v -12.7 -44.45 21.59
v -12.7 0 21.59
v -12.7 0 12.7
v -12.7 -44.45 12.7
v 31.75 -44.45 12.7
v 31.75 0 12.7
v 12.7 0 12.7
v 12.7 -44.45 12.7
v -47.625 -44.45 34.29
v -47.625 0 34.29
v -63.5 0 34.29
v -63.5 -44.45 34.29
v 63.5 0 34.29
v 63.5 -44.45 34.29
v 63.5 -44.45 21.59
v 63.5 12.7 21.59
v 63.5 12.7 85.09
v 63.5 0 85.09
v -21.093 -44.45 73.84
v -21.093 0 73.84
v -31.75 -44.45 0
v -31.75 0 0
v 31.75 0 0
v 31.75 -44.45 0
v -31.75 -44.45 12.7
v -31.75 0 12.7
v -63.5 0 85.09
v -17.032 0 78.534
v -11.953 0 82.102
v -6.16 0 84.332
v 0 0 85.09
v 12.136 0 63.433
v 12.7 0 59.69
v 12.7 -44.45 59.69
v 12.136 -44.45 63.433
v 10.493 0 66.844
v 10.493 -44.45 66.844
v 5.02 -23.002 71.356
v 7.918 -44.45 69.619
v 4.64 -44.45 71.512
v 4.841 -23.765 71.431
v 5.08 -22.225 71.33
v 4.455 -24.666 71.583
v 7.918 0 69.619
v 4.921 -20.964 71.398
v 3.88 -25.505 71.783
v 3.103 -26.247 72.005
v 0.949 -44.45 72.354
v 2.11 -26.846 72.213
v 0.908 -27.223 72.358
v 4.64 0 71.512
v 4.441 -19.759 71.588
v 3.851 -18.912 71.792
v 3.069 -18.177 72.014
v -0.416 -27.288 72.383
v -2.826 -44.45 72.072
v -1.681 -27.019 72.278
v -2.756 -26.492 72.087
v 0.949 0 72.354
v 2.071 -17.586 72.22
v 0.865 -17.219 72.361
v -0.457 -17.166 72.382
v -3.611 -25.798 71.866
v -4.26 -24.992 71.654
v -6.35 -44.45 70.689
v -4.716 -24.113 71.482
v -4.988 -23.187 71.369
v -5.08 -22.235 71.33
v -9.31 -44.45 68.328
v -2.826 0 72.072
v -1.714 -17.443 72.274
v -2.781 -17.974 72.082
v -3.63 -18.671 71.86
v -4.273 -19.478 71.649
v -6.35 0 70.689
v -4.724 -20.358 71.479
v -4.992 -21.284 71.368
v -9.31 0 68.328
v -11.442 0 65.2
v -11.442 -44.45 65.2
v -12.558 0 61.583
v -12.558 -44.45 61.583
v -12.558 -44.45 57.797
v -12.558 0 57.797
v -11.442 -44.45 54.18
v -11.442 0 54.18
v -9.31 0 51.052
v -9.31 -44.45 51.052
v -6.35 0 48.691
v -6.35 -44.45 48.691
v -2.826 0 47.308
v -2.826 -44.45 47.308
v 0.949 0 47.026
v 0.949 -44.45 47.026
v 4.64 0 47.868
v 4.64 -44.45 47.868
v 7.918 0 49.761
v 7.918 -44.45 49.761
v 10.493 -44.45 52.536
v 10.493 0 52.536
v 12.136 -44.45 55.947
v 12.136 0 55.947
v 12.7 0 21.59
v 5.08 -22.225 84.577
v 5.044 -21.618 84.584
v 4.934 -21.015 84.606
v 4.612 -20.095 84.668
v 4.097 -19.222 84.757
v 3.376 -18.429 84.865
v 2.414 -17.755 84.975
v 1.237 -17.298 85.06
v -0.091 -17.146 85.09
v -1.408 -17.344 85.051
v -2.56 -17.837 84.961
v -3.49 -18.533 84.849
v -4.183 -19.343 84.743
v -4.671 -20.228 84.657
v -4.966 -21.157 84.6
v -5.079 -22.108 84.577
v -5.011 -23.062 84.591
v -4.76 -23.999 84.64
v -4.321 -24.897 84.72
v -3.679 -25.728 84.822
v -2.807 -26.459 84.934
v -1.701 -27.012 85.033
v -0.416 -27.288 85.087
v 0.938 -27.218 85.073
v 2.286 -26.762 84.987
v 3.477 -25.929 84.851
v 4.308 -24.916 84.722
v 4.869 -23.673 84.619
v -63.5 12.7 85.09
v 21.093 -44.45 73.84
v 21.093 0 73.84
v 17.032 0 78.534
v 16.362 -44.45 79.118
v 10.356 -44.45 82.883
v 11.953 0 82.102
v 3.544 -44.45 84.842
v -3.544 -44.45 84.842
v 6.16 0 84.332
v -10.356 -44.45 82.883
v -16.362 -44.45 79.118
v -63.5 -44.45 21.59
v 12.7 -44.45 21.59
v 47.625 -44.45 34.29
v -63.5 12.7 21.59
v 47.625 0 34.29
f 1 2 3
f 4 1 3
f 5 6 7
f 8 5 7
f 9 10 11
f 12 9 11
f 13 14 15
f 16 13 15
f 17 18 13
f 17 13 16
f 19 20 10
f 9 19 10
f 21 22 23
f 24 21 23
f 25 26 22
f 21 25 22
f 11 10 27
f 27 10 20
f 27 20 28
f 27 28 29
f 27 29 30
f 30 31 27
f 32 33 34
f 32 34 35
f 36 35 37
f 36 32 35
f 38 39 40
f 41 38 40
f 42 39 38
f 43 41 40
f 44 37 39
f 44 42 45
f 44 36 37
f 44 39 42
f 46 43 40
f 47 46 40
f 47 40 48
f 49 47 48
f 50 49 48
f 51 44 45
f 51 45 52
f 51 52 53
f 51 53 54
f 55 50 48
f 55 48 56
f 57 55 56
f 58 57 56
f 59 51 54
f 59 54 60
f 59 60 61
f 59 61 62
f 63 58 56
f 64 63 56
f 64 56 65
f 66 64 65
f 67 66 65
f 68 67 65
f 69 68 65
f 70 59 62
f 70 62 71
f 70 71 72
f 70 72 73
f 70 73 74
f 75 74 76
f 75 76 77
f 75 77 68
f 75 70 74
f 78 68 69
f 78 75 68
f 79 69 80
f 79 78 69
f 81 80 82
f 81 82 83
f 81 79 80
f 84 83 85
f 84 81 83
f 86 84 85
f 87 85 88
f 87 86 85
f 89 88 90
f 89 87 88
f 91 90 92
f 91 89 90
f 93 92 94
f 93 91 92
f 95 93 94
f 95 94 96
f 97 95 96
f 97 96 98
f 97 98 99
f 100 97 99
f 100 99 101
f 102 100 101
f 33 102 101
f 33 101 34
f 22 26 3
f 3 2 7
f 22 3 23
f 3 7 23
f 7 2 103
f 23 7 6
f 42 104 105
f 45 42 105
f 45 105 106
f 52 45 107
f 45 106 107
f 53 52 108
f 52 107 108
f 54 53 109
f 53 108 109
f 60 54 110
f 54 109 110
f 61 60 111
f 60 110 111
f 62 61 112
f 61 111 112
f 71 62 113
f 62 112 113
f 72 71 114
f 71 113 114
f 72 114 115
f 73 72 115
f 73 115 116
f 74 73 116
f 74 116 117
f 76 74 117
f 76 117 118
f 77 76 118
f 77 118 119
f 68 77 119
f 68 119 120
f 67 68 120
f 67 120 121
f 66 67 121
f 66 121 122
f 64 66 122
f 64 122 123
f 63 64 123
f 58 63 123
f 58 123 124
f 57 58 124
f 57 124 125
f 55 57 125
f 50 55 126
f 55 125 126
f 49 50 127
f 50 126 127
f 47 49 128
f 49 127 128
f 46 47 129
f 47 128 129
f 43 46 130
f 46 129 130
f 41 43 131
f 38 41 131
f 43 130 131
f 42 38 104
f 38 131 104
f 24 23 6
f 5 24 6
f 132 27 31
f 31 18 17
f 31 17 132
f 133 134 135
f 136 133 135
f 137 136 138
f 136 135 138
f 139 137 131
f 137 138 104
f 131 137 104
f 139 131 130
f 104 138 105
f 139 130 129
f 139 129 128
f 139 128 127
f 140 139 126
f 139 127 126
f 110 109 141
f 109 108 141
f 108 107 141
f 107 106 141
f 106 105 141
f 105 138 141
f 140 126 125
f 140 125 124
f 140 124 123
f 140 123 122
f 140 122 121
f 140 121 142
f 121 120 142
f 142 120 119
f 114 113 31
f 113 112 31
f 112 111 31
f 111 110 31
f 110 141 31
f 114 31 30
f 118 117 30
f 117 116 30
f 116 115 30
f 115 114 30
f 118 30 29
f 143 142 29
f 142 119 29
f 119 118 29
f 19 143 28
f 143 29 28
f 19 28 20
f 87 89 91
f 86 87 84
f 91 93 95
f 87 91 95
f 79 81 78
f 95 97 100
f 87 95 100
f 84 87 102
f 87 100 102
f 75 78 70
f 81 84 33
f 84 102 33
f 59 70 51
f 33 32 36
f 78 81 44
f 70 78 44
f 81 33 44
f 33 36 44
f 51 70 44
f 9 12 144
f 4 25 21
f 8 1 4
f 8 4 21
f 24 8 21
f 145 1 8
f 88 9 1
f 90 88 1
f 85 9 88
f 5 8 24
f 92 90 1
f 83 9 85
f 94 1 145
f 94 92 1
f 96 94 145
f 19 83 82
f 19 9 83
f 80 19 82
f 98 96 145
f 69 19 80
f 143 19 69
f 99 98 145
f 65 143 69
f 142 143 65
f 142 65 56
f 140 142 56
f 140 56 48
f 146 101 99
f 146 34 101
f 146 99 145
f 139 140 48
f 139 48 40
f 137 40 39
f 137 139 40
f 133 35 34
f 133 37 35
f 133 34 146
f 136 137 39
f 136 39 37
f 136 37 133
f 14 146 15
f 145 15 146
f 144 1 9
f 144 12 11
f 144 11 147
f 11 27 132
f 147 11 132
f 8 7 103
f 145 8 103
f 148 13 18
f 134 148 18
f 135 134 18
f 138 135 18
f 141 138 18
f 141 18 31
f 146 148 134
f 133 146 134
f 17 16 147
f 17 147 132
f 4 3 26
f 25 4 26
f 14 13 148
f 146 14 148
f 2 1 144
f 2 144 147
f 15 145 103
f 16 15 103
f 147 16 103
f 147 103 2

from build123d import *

# Parameters (mm, degrees)
F0_R     = 12.7
F1_DEPTH = 44.45
F2_W     = 12.7
F2_H     = 63.5
F3_DEPTH = 127
F5_R     = 5.08
F6_DEPTH = 25.4


with BuildPart() as f1:
    # F0 (on Front) → F1 (new body)
    with BuildSketch(Plane.XZ):
        with BuildLine():
            Line((-31.75, 0), (0, 0))
            Line((0, 0), (31.75, 0))
            Line((31.75, 0), (31.75, 12.7))
            Line((31.75, 12.7), (12.7, 12.7))
            Line((12.7, 12.7), (12.7, 21.59))
            Line((12.7, 21.59), (63.5, 21.59))
            Line((63.5, 21.59), (63.5, 34.29))
            Line((63.5, 34.29), (47.625, 34.29))
            Line((47.625, 34.29), (21.093426, 73.840173))
            ThreePointArc((21.093426, 73.840173), (0, 85.09), (-21.093426, 73.840173))
            Line((-21.093426, 73.840173), (-47.625, 34.29))
            Line((-47.625, 34.29), (-63.5, 34.29))
            Line((-63.5, 34.29), (-63.5, 21.59))
            Line((-63.5, 21.59), (-12.7, 21.59))
            Line((-12.7, 21.59), (-12.7, 12.7))
            Line((-12.7, 12.7), (-31.75, 12.7))
            Line((-31.75, 12.7), (-31.75, 0))
        make_face()
        with Locations((0, 59.69)):
            Circle(F0_R, mode=Mode.SUBTRACT)
    extrude(amount=F1_DEPTH)

    # F2 (on face) → F3 (join)
    with BuildSketch(Plane.YZ.offset(63.5)):
        with Locations((6.35, 53.34)):
            Rectangle(F2_W, F2_H)
    extrude(amount=-F3_DEPTH)

    # F5 (on offset) → F6 (cut)
    with BuildSketch(Plane.XY.offset(85.09)):
        with Locations((0, -22.225)):
            Circle(F5_R)
    extrude(amount=-F6_DEPTH, mode=Mode.SUBTRACT)


solid = f1.part
